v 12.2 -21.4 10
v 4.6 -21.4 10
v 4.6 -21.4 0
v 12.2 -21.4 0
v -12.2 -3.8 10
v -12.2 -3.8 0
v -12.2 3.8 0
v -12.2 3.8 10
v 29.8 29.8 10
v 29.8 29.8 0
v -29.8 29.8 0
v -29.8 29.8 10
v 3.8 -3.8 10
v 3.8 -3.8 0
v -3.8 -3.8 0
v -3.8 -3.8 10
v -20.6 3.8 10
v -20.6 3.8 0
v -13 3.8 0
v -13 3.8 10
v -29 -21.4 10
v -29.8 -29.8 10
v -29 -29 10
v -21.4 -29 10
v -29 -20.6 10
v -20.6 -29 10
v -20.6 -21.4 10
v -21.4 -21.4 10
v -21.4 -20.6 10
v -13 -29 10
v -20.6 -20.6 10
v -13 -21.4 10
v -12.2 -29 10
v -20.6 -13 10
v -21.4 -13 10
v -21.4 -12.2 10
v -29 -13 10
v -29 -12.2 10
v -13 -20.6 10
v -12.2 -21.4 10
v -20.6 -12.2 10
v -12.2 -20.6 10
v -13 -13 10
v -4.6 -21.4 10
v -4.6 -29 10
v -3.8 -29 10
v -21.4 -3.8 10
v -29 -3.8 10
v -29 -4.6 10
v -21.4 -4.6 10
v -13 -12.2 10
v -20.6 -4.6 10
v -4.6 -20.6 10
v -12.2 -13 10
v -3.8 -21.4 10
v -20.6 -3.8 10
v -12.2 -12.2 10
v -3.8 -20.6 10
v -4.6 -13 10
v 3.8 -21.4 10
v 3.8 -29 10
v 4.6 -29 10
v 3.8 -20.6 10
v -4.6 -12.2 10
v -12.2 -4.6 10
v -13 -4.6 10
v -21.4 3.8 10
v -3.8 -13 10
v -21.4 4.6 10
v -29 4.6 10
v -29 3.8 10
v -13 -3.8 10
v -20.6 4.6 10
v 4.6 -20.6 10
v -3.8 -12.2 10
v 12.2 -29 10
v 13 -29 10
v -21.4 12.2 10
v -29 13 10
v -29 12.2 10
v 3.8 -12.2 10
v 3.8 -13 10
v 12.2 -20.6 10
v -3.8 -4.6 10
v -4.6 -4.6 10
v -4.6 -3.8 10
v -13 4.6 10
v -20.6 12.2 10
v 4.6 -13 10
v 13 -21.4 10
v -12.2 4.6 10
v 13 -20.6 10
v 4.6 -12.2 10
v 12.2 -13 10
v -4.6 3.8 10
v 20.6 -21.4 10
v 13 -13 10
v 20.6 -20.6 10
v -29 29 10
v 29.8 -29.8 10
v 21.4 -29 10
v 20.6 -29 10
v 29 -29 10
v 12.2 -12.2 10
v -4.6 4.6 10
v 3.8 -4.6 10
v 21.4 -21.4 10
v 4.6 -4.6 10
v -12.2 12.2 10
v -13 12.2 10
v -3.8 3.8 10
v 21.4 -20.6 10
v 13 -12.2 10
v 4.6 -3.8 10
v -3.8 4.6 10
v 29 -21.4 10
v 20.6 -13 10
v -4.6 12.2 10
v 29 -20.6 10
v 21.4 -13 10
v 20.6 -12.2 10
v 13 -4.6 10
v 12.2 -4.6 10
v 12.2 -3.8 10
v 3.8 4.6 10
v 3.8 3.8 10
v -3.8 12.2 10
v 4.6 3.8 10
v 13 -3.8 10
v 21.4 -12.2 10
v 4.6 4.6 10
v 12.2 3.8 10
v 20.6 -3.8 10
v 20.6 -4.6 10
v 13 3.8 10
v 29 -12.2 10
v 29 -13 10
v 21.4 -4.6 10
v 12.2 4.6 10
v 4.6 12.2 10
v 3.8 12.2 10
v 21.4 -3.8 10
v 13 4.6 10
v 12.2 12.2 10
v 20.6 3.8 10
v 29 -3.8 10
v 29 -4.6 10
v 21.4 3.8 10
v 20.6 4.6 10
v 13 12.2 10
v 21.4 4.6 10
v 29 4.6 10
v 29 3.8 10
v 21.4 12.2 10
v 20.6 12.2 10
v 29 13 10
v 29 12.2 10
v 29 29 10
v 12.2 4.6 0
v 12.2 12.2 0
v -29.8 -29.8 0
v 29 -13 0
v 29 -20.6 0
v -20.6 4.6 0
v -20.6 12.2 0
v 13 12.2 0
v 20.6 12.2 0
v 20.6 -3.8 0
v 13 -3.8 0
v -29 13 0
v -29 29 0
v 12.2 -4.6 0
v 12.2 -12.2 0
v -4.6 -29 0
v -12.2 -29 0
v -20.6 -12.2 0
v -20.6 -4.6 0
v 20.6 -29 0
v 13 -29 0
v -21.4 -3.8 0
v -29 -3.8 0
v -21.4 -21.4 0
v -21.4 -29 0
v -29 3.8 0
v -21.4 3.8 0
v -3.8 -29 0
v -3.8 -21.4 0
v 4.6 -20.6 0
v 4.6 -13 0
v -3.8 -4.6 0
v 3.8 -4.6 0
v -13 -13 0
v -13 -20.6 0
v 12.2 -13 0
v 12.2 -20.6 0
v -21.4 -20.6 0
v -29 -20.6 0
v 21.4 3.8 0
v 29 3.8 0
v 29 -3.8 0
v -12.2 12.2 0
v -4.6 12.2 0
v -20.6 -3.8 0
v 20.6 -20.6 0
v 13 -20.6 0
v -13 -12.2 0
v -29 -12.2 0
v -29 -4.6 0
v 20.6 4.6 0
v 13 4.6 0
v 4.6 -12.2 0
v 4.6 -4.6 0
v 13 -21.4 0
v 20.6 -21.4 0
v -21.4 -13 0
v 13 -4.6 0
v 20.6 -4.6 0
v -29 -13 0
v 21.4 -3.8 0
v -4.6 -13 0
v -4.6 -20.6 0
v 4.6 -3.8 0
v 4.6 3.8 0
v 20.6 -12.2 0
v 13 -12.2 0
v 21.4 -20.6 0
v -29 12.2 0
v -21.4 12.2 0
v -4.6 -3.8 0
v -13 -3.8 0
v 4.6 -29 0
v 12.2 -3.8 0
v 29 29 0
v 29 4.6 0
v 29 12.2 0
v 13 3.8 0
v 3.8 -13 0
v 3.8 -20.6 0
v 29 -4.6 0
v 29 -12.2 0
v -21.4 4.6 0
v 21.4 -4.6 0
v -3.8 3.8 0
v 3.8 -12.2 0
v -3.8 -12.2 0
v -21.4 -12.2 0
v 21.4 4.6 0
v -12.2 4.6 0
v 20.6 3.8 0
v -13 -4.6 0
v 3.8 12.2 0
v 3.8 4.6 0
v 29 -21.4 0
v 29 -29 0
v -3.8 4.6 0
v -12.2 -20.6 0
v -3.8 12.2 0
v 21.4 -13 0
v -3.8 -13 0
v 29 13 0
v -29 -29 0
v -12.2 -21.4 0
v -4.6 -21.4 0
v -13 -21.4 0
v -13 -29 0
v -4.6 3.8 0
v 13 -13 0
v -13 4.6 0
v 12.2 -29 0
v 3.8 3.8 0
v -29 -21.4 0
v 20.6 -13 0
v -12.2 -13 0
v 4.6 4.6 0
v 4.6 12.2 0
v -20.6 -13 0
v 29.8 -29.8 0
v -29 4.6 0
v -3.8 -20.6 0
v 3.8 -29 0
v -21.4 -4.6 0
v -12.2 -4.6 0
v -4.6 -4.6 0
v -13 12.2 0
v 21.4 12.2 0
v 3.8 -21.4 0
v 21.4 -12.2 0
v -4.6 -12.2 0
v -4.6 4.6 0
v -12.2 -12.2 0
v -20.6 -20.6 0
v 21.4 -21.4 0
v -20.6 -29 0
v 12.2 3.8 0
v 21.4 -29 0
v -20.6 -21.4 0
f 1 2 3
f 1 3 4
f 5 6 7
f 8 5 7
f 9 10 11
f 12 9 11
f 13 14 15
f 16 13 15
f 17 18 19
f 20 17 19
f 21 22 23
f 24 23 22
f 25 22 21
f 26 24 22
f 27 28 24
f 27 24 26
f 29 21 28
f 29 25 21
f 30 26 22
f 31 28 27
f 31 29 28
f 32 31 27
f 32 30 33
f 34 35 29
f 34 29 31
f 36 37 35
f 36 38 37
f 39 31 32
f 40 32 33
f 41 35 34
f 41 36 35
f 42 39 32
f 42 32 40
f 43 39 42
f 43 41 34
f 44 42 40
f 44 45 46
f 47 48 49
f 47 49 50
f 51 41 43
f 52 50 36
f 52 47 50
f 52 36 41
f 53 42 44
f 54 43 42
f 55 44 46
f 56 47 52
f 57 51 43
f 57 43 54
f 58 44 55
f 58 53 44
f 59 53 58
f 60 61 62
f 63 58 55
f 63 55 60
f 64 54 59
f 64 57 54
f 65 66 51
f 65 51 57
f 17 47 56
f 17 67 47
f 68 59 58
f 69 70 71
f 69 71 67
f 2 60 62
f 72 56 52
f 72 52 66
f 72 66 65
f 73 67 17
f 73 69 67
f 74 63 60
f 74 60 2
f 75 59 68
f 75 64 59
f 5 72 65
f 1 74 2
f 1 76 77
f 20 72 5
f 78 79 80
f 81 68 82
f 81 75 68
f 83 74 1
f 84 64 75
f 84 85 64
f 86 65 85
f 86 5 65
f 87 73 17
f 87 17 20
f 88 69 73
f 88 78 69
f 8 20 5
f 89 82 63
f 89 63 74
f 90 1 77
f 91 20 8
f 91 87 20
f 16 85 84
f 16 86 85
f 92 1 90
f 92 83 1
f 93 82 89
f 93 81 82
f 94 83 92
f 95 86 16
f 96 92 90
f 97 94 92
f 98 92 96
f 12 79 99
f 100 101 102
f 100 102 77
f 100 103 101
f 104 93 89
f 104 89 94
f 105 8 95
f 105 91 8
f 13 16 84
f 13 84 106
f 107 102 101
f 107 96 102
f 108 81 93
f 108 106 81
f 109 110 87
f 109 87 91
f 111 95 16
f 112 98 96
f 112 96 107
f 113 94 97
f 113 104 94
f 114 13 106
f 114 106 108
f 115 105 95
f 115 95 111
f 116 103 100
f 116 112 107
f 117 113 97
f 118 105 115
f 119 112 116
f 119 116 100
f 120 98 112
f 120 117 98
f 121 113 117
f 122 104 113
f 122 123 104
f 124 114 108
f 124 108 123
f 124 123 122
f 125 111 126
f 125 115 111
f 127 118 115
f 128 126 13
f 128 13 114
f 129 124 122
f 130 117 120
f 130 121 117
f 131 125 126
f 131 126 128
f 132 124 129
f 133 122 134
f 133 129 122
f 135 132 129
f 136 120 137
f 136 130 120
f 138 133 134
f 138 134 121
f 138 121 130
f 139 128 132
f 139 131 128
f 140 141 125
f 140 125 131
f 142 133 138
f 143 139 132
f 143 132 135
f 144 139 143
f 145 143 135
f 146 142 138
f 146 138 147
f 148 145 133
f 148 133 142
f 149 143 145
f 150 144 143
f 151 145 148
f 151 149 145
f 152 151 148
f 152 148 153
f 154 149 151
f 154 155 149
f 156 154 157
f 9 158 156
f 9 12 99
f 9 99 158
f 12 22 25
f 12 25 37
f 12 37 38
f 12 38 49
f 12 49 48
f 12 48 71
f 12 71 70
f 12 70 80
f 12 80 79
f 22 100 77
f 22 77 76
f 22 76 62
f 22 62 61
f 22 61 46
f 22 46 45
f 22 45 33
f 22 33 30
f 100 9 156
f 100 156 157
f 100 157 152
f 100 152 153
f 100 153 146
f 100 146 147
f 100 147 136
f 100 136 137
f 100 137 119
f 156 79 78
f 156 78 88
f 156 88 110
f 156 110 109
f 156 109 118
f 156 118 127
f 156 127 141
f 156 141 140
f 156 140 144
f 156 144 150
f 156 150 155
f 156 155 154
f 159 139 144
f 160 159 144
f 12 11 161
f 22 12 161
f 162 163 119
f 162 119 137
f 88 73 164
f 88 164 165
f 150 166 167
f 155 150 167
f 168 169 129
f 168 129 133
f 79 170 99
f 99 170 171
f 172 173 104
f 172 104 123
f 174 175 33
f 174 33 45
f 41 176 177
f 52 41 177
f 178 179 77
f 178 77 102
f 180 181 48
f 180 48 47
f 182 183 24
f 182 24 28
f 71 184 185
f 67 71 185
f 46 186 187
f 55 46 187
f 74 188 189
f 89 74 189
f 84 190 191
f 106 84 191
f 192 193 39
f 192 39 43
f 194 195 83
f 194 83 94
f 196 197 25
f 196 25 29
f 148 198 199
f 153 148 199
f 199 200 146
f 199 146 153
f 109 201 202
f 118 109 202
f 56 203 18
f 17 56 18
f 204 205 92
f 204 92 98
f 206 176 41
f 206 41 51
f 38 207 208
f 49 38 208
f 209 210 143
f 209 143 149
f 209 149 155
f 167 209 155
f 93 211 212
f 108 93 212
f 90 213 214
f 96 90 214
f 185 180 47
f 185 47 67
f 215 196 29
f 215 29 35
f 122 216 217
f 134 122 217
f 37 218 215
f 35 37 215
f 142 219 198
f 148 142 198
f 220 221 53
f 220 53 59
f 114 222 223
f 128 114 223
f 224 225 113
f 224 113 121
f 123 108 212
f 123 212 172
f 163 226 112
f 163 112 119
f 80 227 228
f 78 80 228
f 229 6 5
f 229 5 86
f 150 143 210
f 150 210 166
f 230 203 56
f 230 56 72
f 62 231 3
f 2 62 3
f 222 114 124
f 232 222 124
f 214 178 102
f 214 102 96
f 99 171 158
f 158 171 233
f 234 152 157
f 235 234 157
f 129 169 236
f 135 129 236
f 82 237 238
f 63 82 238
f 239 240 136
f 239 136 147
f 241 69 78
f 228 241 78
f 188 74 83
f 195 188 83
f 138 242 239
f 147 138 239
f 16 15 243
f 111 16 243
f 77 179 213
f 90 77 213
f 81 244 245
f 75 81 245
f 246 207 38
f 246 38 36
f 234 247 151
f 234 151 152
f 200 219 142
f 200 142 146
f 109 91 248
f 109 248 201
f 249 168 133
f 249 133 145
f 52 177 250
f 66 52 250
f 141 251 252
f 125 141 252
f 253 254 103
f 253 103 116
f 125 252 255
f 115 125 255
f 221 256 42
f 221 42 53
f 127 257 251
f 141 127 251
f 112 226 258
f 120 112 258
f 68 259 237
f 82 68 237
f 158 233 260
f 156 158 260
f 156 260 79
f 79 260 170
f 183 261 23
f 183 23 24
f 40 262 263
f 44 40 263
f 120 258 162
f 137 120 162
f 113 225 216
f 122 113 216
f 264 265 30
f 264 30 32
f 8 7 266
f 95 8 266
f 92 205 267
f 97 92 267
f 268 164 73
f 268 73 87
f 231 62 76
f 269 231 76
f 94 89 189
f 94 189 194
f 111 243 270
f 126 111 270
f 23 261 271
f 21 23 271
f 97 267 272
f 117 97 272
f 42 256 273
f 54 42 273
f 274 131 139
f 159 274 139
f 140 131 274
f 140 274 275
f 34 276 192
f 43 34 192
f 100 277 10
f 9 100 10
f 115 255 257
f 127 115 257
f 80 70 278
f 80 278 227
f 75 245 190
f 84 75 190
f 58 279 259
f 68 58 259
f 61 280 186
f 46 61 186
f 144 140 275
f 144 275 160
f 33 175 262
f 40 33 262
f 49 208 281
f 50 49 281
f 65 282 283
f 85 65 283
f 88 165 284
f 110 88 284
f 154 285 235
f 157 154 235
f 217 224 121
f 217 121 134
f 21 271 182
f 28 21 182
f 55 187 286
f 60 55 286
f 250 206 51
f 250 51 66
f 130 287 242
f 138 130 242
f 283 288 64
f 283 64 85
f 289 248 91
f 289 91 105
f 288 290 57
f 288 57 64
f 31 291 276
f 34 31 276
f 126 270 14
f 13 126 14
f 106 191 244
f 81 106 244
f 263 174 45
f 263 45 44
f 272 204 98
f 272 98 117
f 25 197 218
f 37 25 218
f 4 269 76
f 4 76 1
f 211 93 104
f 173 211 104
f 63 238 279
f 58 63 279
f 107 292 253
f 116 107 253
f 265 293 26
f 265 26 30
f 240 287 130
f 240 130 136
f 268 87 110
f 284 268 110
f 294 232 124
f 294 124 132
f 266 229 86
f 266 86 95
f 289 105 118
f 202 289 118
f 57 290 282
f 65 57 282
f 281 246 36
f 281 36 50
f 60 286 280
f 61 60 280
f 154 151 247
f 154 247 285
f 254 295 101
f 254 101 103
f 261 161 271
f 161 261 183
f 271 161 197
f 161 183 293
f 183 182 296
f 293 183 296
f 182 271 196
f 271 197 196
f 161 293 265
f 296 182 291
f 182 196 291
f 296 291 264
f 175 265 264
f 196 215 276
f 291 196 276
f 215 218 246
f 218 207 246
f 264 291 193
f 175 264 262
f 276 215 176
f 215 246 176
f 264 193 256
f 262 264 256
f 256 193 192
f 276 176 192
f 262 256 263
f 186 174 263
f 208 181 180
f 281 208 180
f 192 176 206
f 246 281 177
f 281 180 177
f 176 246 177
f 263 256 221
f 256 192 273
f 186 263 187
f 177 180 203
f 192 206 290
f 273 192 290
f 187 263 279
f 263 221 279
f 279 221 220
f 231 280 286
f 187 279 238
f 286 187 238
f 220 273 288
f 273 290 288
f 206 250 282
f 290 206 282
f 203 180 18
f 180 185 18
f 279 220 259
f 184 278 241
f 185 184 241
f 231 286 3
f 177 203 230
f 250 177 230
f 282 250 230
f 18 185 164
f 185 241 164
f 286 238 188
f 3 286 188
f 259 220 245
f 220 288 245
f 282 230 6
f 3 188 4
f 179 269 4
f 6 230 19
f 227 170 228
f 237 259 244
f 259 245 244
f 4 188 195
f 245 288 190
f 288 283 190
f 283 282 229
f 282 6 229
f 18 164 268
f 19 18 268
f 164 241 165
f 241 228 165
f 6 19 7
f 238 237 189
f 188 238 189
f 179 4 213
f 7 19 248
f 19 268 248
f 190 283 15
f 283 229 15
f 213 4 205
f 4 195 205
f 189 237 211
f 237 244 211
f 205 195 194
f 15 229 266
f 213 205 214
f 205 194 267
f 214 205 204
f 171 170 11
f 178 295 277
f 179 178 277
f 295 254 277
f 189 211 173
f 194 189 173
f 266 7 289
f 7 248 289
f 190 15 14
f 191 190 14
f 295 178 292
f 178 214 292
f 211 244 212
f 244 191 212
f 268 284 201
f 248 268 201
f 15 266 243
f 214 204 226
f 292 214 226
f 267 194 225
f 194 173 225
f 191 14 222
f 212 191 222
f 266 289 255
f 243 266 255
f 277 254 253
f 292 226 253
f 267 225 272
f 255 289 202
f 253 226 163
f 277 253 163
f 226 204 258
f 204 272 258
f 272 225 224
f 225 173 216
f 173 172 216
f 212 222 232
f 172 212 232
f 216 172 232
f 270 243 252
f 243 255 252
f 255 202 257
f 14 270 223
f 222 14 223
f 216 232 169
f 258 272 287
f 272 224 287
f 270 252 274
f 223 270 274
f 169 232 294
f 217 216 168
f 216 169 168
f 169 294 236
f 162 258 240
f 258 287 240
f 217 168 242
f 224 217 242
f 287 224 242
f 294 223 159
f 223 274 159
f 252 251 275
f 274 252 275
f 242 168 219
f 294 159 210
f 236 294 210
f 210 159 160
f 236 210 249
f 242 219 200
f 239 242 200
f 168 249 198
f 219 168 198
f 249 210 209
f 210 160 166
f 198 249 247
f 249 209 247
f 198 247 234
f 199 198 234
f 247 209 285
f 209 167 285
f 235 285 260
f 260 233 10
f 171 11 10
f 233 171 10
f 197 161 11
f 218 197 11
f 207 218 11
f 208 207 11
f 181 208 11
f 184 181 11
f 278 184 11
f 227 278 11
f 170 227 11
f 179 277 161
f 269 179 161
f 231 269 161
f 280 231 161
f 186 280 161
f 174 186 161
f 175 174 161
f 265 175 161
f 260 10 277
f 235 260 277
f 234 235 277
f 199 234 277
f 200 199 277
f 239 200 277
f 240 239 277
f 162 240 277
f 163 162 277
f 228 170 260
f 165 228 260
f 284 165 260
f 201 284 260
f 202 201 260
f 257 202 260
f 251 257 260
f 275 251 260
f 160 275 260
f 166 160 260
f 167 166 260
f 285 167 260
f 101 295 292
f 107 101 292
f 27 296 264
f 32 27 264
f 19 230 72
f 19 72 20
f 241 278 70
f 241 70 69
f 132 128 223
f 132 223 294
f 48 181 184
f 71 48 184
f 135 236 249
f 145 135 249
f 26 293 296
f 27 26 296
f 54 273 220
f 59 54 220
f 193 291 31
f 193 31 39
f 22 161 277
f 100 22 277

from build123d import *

# Parameters (mm, degrees)
F0_W     = 7.6
F0_H     = 7.6
F1_DEPTH = 10


with BuildPart() as f1:
    # F0 (on Top) → F1 (new body)
    with BuildSketch(Plane.XY):
        Polygon((29.8, 29.8), (0, 29.8), (-29.8, 29.8), (-29.8, 0), (-29.8, -29.8), (0, -29.8), (29.8, -29.8), (29.8, 0), align=None)
        with Locations((-25.2, -25.2)):
            Rectangle(F0_W, F0_H, mode=Mode.SUBTRACT)
        with Locations((-16.8, -25.2)):
            Rectangle(F0_W, F0_H, mode=Mode.SUBTRACT)
        with Locations((-25.2, -16.8)):
            Rectangle(F0_W, F0_H, mode=Mode.SUBTRACT)
        with Locations((-16.8, -16.8)):
            Rectangle(F0_W, F0_H, mode=Mode.SUBTRACT)
        with Locations((-8.4, -25.2)):
            Rectangle(F0_W, F0_H, mode=Mode.SUBTRACT)
        with Locations((-8.4, -16.8)):
            Rectangle(F0_W, F0_H, mode=Mode.SUBTRACT)
        with Locations((-25.2, -8.4)):
            Rectangle(F0_W, F0_H, mode=Mode.SUBTRACT)
        with Locations((-16.8, -8.4)):
            Rectangle(F0_W, F0_H, mode=Mode.SUBTRACT)
        with Locations((-8.4, -8.4)):
            Rectangle(F0_W, F0_H, mode=Mode.SUBTRACT)
        Polygon((0, -29), (-3.8, -29), (-3.8, -21.4), (0, -21.4), (3.8, -21.4), (3.8, -29), align=None, mode=Mode.SUBTRACT)
        with Locations((8.4, -25.2)):
            Rectangle(F0_W, F0_H, mode=Mode.SUBTRACT)
        Polygon((0, -20.6), (-3.8, -20.6), (-3.8, -13), (0, -13), (3.8, -13), (3.8, -20.6), align=None, mode=Mode.SUBTRACT)
        with Locations((8.4, -16.8)):
            Rectangle(F0_W, F0_H, mode=Mode.SUBTRACT)
        with Locations((16.8, -25.2)):
            Rectangle(F0_W, F0_H, mode=Mode.SUBTRACT)
        with Locations((25.2, -25.2)):
            Rectangle(F0_W, F0_H, mode=Mode.SUBTRACT)
        with Locations((16.8, -16.8)):
            Rectangle(F0_W, F0_H, mode=Mode.SUBTRACT)
        with Locations((25.2, -16.8)):
            Rectangle(F0_W, F0_H, mode=Mode.SUBTRACT)
        Polygon((0, -12.2), (-3.8, -12.2), (-3.8, -4.6), (0, -4.6), (3.8, -4.6), (3.8, -12.2), align=None, mode=Mode.SUBTRACT)
        with Locations((8.4, -8.4)):
            Rectangle(F0_W, F0_H, mode=Mode.SUBTRACT)
        with Locations((16.8, -8.4)):
            Rectangle(F0_W, F0_H, mode=Mode.SUBTRACT)
        with Locations((25.2, -8.4)):
            Rectangle(F0_W, F0_H, mode=Mode.SUBTRACT)
        with Locations((-25.2, 0)):
            Rectangle(F0_W, F0_H, mode=Mode.SUBTRACT)
        with Locations((-16.8, 0)):
            Rectangle(F0_W, F0_H, mode=Mode.SUBTRACT)
        with Locations((-25.2, 8.4)):
            Rectangle(F0_W, F0_H, mode=Mode.SUBTRACT)
        with Locations((-16.8, 8.4)):
            Rectangle(F0_W, F0_H, mode=Mode.SUBTRACT)
        with Locations((-8.4, 0)):
            Rectangle(F0_W, F0_H, mode=Mode.SUBTRACT)
        with Locations((-8.4, 8.4)):
            Rectangle(F0_W, F0_H, mode=Mode.SUBTRACT)
        Polygon((0, -3.8), (-3.8, -3.8), (-3.8, 3.8), (0, 3.8), (3.8, 3.8), (3.8, -3.8), align=None, mode=Mode.SUBTRACT)
        with Locations((8.4, 0)):
            Rectangle(F0_W, F0_H, mode=Mode.SUBTRACT)
        Polygon((-3.8, 4.6), (-3.8, 12.2), (0, 12.2), (3.8, 12.2), (3.8, 4.6), (0, 4.6), align=None, mode=Mode.SUBTRACT)
        with Locations((8.4, 8.4)):
            Rectangle(F0_W, F0_H, mode=Mode.SUBTRACT)
        with Locations((16.8, 0)):
            Rectangle(F0_W, F0_H, mode=Mode.SUBTRACT)
        with Locations((25.2, 0)):
            Rectangle(F0_W, F0_H, mode=Mode.SUBTRACT)
        with Locations((16.8, 8.4)):
            Rectangle(F0_W, F0_H, mode=Mode.SUBTRACT)
        with Locations((25.2, 8.4)):
            Rectangle(F0_W, F0_H, mode=Mode.SUBTRACT)
        Polygon((0, 13), (-29, 13), (-29, 29), (0, 29), (29, 29), (29, 13), align=None, mode=Mode.SUBTRACT)
    extrude(amount=F1_DEPTH)


solid = f1.part
